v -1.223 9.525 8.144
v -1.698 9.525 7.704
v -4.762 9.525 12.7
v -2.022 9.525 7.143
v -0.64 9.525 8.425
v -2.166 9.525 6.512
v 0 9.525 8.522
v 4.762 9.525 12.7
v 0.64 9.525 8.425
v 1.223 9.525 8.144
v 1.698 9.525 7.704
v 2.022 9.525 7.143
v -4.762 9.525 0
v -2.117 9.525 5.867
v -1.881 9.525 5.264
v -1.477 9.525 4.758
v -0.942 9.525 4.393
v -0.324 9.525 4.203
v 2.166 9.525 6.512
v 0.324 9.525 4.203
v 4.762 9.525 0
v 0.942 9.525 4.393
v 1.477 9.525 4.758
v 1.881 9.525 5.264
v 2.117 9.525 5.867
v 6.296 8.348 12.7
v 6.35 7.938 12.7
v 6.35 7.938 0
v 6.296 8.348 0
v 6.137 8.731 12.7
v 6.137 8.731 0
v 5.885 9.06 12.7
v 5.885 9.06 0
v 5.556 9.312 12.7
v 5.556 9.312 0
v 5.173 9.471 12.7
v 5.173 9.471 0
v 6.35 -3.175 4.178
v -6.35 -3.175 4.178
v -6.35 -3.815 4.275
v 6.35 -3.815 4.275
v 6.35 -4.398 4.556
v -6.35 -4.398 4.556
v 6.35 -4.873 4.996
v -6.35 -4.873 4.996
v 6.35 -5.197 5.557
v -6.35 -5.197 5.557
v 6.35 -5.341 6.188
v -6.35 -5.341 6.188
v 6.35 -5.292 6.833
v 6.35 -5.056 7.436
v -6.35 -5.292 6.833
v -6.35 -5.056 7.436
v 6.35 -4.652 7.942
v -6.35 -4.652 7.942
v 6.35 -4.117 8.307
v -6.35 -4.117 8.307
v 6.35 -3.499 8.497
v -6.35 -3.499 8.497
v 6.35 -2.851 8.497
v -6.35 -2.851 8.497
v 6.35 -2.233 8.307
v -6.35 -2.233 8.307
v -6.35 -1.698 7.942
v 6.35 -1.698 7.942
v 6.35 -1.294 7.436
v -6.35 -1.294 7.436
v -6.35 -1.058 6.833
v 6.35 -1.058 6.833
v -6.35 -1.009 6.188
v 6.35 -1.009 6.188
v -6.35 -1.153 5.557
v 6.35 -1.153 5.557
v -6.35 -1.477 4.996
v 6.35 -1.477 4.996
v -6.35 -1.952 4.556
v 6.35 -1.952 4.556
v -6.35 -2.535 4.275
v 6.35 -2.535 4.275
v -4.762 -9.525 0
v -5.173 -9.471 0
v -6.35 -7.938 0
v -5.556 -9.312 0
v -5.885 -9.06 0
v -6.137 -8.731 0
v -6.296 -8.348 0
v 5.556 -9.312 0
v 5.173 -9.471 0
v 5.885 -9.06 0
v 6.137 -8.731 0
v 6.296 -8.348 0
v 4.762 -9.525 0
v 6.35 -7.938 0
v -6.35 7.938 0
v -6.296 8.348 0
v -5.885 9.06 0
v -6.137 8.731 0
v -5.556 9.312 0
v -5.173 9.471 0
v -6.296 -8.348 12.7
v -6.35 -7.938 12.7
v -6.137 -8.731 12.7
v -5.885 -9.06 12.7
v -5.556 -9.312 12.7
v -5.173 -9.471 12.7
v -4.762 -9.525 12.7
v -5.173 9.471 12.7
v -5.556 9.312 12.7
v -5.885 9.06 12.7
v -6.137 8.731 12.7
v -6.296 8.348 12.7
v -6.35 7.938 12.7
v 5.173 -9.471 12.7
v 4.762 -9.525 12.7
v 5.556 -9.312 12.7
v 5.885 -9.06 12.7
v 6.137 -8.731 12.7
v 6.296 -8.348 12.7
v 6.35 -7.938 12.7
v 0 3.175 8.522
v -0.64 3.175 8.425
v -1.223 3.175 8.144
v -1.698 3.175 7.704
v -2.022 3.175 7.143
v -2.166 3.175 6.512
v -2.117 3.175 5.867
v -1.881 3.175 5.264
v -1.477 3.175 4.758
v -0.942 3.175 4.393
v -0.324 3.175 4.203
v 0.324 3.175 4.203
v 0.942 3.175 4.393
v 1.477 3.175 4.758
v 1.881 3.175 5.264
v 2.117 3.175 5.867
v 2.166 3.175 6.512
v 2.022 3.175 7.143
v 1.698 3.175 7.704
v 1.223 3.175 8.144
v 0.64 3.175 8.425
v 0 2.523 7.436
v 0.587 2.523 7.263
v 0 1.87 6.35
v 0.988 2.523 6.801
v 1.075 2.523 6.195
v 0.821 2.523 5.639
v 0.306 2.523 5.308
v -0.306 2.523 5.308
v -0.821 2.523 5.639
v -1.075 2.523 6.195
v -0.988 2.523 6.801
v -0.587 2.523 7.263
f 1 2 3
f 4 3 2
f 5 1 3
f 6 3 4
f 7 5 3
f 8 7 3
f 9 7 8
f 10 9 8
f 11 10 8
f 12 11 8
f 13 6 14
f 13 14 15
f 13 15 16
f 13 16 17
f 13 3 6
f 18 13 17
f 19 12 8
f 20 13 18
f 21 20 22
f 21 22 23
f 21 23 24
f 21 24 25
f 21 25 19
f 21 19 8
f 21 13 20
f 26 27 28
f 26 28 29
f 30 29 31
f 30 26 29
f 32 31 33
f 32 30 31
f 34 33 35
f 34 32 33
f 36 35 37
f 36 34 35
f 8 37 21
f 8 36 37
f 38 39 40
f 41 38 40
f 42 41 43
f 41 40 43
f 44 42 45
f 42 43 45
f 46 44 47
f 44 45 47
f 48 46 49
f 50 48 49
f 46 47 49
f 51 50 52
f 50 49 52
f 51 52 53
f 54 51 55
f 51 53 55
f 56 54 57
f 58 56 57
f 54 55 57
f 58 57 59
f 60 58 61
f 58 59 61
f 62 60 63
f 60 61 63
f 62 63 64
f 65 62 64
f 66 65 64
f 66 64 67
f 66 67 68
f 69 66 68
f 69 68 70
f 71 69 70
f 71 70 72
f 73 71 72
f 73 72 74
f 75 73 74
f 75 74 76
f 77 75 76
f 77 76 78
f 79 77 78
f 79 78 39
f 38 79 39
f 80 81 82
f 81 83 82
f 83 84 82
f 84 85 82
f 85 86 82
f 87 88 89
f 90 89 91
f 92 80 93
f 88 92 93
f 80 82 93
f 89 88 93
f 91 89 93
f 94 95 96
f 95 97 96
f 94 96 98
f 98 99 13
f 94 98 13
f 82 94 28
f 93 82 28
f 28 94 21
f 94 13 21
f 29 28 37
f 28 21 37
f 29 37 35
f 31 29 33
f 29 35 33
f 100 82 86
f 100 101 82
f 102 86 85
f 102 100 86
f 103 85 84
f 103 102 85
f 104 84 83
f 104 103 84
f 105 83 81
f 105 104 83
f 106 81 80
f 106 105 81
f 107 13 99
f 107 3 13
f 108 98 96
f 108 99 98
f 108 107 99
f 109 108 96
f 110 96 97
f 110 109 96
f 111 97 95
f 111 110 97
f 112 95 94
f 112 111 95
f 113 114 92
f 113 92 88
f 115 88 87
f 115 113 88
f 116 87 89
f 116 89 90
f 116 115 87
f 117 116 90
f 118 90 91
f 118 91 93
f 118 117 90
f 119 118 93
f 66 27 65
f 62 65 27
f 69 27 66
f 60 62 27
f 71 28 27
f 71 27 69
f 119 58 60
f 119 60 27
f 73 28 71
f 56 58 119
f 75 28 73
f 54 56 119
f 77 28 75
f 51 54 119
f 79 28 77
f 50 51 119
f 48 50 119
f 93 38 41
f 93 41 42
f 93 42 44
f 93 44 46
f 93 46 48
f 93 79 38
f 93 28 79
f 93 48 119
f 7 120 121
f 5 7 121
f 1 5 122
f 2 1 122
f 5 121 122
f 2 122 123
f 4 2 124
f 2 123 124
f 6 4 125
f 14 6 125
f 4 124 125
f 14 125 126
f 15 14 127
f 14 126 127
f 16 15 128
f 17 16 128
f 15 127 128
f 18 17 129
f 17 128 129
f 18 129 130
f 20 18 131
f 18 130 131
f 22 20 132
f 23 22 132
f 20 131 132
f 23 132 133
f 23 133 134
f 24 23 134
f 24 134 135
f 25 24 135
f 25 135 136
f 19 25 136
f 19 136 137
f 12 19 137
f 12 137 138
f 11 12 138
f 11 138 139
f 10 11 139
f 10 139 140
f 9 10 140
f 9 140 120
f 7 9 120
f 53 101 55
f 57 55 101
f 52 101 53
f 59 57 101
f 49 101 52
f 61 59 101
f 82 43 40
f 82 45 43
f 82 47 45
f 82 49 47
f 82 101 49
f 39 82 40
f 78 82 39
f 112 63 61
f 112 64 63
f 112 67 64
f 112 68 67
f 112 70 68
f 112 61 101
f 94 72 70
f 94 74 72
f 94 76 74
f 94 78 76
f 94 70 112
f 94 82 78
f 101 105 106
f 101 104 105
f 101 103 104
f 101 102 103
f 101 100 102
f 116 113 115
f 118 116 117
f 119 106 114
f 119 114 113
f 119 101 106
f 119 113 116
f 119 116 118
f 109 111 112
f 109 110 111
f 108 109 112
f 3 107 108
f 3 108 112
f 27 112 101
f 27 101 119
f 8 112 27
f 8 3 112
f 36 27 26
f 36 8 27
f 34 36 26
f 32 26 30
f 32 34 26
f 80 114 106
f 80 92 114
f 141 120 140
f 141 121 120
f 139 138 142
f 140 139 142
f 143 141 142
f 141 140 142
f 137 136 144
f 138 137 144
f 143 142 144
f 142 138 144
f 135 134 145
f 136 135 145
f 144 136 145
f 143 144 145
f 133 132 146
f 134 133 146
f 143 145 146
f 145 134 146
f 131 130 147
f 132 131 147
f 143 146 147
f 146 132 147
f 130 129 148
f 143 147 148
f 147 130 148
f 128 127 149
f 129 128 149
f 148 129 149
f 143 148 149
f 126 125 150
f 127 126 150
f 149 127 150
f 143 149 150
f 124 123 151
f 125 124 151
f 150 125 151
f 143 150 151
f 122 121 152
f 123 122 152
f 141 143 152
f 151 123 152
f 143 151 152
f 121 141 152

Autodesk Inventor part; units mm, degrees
ref_plane "YZ Plane" through (0, 0, 0) normal (1, 0, 0) x (0, 1, 0)
ref_plane "XZ Plane" through (0, 0, 0) normal (0, 1, 0) x (-1, 0, 0)
ref_plane "XY Plane" through (0, 0, 0) normal (0, 0, 1) x (1, 0, 0)
sketch "Sketch1" plane through (0, 0, 0) normal (0, 0, 1) x (1, 0, 0)
  line L0 (6.35, -9.525) -> (-6.35, -9.525)
  line L1 (-6.35, -9.525) -> (-6.35, 9.525)
  line L2 (-6.35, 9.525) -> (6.35, 9.525)
  line L3 (6.35, 9.525) -> (6.35, -9.525)
  line L4 (6.35, -9.525) -> (-6.35, 9.525) construction
  line L5 (-6.35, -9.525) -> (6.35, 9.525) construction
  point P0 (0, 0)
  dimension "d0" = 12.7
  dimension "d1" = 19.05
extrude "Plate1" add sketch "Sketch1" along normal blind 12.7
sketch "Sketch2" plane through (-6.35, 9.525, 0) normal (0, 1, 0) x (1, 0, 0)
  line L0 (12.7, 0) -> (0, 0) projected
  point P0 (6.35, 0)
  point P1 (6.35, -6.35)
  point P2 (6.35, 0)
  dimension "d3" = 6.35
hole "Hole1" at (0, 9.525, 6.35) direction (0, -1, 0) diameter 4.3434 depth 6.35 tip angle 118 thread size "12-24 UNC" class "2B" standard "ANSI Unified Screw Threads"
sketch "Sketch3" plane through (6.35, -9.525, 0) normal (1, 0, 0) x (0, 0, -1)
  line L0 (0, 19.05) -> (-12.7, 19.05) projected
  point P0 (0, 9.525)
  point P1 (-6.35, 6.35)
  point P2 (-6.35, 19.05)
  dimension "d11" = 12.7
hole "Hole2" at (6.35, -3.175, 6.35) direction (-1, 0, 0) diameter 4.3434 depth 12.7 thread size "12-24 UNC" class "2B" standard "ANSI Unified Screw Threads"
fillet "Corner Round1" radius 1.5875 4 edges at (6.35, 9.525, 6.35) (-6.35, 9.525, 6.35) (-6.35, -9.525, 6.35) (6.35, -9.525, 6.35)
equation "\"d17\" = Thickness"
equation "\"d2\" = Thickness"
equation "\"BendRadius\" = Thickness"
equation "\"BendReliefWidth\" = Thickness"
equation "\"BendReliefDepth\" = 0.5 * Thickness"
equation "\"CornerReliefSize\" = 4 * Thickness"
equation "\"MinimumRemnant\" = 2 * Thickness"
equation "\"TransitionRadius\" = BendRadius"
equation "\"JacobiRadiusSize\" = BendRadius"
equation "\"GapSize\" = Thickness"
equation "\"Thickness\" = 12.7"
properties part number "PLATE,NUT-BLOCK,SINGLE-L" material "Aluminum 6061"
